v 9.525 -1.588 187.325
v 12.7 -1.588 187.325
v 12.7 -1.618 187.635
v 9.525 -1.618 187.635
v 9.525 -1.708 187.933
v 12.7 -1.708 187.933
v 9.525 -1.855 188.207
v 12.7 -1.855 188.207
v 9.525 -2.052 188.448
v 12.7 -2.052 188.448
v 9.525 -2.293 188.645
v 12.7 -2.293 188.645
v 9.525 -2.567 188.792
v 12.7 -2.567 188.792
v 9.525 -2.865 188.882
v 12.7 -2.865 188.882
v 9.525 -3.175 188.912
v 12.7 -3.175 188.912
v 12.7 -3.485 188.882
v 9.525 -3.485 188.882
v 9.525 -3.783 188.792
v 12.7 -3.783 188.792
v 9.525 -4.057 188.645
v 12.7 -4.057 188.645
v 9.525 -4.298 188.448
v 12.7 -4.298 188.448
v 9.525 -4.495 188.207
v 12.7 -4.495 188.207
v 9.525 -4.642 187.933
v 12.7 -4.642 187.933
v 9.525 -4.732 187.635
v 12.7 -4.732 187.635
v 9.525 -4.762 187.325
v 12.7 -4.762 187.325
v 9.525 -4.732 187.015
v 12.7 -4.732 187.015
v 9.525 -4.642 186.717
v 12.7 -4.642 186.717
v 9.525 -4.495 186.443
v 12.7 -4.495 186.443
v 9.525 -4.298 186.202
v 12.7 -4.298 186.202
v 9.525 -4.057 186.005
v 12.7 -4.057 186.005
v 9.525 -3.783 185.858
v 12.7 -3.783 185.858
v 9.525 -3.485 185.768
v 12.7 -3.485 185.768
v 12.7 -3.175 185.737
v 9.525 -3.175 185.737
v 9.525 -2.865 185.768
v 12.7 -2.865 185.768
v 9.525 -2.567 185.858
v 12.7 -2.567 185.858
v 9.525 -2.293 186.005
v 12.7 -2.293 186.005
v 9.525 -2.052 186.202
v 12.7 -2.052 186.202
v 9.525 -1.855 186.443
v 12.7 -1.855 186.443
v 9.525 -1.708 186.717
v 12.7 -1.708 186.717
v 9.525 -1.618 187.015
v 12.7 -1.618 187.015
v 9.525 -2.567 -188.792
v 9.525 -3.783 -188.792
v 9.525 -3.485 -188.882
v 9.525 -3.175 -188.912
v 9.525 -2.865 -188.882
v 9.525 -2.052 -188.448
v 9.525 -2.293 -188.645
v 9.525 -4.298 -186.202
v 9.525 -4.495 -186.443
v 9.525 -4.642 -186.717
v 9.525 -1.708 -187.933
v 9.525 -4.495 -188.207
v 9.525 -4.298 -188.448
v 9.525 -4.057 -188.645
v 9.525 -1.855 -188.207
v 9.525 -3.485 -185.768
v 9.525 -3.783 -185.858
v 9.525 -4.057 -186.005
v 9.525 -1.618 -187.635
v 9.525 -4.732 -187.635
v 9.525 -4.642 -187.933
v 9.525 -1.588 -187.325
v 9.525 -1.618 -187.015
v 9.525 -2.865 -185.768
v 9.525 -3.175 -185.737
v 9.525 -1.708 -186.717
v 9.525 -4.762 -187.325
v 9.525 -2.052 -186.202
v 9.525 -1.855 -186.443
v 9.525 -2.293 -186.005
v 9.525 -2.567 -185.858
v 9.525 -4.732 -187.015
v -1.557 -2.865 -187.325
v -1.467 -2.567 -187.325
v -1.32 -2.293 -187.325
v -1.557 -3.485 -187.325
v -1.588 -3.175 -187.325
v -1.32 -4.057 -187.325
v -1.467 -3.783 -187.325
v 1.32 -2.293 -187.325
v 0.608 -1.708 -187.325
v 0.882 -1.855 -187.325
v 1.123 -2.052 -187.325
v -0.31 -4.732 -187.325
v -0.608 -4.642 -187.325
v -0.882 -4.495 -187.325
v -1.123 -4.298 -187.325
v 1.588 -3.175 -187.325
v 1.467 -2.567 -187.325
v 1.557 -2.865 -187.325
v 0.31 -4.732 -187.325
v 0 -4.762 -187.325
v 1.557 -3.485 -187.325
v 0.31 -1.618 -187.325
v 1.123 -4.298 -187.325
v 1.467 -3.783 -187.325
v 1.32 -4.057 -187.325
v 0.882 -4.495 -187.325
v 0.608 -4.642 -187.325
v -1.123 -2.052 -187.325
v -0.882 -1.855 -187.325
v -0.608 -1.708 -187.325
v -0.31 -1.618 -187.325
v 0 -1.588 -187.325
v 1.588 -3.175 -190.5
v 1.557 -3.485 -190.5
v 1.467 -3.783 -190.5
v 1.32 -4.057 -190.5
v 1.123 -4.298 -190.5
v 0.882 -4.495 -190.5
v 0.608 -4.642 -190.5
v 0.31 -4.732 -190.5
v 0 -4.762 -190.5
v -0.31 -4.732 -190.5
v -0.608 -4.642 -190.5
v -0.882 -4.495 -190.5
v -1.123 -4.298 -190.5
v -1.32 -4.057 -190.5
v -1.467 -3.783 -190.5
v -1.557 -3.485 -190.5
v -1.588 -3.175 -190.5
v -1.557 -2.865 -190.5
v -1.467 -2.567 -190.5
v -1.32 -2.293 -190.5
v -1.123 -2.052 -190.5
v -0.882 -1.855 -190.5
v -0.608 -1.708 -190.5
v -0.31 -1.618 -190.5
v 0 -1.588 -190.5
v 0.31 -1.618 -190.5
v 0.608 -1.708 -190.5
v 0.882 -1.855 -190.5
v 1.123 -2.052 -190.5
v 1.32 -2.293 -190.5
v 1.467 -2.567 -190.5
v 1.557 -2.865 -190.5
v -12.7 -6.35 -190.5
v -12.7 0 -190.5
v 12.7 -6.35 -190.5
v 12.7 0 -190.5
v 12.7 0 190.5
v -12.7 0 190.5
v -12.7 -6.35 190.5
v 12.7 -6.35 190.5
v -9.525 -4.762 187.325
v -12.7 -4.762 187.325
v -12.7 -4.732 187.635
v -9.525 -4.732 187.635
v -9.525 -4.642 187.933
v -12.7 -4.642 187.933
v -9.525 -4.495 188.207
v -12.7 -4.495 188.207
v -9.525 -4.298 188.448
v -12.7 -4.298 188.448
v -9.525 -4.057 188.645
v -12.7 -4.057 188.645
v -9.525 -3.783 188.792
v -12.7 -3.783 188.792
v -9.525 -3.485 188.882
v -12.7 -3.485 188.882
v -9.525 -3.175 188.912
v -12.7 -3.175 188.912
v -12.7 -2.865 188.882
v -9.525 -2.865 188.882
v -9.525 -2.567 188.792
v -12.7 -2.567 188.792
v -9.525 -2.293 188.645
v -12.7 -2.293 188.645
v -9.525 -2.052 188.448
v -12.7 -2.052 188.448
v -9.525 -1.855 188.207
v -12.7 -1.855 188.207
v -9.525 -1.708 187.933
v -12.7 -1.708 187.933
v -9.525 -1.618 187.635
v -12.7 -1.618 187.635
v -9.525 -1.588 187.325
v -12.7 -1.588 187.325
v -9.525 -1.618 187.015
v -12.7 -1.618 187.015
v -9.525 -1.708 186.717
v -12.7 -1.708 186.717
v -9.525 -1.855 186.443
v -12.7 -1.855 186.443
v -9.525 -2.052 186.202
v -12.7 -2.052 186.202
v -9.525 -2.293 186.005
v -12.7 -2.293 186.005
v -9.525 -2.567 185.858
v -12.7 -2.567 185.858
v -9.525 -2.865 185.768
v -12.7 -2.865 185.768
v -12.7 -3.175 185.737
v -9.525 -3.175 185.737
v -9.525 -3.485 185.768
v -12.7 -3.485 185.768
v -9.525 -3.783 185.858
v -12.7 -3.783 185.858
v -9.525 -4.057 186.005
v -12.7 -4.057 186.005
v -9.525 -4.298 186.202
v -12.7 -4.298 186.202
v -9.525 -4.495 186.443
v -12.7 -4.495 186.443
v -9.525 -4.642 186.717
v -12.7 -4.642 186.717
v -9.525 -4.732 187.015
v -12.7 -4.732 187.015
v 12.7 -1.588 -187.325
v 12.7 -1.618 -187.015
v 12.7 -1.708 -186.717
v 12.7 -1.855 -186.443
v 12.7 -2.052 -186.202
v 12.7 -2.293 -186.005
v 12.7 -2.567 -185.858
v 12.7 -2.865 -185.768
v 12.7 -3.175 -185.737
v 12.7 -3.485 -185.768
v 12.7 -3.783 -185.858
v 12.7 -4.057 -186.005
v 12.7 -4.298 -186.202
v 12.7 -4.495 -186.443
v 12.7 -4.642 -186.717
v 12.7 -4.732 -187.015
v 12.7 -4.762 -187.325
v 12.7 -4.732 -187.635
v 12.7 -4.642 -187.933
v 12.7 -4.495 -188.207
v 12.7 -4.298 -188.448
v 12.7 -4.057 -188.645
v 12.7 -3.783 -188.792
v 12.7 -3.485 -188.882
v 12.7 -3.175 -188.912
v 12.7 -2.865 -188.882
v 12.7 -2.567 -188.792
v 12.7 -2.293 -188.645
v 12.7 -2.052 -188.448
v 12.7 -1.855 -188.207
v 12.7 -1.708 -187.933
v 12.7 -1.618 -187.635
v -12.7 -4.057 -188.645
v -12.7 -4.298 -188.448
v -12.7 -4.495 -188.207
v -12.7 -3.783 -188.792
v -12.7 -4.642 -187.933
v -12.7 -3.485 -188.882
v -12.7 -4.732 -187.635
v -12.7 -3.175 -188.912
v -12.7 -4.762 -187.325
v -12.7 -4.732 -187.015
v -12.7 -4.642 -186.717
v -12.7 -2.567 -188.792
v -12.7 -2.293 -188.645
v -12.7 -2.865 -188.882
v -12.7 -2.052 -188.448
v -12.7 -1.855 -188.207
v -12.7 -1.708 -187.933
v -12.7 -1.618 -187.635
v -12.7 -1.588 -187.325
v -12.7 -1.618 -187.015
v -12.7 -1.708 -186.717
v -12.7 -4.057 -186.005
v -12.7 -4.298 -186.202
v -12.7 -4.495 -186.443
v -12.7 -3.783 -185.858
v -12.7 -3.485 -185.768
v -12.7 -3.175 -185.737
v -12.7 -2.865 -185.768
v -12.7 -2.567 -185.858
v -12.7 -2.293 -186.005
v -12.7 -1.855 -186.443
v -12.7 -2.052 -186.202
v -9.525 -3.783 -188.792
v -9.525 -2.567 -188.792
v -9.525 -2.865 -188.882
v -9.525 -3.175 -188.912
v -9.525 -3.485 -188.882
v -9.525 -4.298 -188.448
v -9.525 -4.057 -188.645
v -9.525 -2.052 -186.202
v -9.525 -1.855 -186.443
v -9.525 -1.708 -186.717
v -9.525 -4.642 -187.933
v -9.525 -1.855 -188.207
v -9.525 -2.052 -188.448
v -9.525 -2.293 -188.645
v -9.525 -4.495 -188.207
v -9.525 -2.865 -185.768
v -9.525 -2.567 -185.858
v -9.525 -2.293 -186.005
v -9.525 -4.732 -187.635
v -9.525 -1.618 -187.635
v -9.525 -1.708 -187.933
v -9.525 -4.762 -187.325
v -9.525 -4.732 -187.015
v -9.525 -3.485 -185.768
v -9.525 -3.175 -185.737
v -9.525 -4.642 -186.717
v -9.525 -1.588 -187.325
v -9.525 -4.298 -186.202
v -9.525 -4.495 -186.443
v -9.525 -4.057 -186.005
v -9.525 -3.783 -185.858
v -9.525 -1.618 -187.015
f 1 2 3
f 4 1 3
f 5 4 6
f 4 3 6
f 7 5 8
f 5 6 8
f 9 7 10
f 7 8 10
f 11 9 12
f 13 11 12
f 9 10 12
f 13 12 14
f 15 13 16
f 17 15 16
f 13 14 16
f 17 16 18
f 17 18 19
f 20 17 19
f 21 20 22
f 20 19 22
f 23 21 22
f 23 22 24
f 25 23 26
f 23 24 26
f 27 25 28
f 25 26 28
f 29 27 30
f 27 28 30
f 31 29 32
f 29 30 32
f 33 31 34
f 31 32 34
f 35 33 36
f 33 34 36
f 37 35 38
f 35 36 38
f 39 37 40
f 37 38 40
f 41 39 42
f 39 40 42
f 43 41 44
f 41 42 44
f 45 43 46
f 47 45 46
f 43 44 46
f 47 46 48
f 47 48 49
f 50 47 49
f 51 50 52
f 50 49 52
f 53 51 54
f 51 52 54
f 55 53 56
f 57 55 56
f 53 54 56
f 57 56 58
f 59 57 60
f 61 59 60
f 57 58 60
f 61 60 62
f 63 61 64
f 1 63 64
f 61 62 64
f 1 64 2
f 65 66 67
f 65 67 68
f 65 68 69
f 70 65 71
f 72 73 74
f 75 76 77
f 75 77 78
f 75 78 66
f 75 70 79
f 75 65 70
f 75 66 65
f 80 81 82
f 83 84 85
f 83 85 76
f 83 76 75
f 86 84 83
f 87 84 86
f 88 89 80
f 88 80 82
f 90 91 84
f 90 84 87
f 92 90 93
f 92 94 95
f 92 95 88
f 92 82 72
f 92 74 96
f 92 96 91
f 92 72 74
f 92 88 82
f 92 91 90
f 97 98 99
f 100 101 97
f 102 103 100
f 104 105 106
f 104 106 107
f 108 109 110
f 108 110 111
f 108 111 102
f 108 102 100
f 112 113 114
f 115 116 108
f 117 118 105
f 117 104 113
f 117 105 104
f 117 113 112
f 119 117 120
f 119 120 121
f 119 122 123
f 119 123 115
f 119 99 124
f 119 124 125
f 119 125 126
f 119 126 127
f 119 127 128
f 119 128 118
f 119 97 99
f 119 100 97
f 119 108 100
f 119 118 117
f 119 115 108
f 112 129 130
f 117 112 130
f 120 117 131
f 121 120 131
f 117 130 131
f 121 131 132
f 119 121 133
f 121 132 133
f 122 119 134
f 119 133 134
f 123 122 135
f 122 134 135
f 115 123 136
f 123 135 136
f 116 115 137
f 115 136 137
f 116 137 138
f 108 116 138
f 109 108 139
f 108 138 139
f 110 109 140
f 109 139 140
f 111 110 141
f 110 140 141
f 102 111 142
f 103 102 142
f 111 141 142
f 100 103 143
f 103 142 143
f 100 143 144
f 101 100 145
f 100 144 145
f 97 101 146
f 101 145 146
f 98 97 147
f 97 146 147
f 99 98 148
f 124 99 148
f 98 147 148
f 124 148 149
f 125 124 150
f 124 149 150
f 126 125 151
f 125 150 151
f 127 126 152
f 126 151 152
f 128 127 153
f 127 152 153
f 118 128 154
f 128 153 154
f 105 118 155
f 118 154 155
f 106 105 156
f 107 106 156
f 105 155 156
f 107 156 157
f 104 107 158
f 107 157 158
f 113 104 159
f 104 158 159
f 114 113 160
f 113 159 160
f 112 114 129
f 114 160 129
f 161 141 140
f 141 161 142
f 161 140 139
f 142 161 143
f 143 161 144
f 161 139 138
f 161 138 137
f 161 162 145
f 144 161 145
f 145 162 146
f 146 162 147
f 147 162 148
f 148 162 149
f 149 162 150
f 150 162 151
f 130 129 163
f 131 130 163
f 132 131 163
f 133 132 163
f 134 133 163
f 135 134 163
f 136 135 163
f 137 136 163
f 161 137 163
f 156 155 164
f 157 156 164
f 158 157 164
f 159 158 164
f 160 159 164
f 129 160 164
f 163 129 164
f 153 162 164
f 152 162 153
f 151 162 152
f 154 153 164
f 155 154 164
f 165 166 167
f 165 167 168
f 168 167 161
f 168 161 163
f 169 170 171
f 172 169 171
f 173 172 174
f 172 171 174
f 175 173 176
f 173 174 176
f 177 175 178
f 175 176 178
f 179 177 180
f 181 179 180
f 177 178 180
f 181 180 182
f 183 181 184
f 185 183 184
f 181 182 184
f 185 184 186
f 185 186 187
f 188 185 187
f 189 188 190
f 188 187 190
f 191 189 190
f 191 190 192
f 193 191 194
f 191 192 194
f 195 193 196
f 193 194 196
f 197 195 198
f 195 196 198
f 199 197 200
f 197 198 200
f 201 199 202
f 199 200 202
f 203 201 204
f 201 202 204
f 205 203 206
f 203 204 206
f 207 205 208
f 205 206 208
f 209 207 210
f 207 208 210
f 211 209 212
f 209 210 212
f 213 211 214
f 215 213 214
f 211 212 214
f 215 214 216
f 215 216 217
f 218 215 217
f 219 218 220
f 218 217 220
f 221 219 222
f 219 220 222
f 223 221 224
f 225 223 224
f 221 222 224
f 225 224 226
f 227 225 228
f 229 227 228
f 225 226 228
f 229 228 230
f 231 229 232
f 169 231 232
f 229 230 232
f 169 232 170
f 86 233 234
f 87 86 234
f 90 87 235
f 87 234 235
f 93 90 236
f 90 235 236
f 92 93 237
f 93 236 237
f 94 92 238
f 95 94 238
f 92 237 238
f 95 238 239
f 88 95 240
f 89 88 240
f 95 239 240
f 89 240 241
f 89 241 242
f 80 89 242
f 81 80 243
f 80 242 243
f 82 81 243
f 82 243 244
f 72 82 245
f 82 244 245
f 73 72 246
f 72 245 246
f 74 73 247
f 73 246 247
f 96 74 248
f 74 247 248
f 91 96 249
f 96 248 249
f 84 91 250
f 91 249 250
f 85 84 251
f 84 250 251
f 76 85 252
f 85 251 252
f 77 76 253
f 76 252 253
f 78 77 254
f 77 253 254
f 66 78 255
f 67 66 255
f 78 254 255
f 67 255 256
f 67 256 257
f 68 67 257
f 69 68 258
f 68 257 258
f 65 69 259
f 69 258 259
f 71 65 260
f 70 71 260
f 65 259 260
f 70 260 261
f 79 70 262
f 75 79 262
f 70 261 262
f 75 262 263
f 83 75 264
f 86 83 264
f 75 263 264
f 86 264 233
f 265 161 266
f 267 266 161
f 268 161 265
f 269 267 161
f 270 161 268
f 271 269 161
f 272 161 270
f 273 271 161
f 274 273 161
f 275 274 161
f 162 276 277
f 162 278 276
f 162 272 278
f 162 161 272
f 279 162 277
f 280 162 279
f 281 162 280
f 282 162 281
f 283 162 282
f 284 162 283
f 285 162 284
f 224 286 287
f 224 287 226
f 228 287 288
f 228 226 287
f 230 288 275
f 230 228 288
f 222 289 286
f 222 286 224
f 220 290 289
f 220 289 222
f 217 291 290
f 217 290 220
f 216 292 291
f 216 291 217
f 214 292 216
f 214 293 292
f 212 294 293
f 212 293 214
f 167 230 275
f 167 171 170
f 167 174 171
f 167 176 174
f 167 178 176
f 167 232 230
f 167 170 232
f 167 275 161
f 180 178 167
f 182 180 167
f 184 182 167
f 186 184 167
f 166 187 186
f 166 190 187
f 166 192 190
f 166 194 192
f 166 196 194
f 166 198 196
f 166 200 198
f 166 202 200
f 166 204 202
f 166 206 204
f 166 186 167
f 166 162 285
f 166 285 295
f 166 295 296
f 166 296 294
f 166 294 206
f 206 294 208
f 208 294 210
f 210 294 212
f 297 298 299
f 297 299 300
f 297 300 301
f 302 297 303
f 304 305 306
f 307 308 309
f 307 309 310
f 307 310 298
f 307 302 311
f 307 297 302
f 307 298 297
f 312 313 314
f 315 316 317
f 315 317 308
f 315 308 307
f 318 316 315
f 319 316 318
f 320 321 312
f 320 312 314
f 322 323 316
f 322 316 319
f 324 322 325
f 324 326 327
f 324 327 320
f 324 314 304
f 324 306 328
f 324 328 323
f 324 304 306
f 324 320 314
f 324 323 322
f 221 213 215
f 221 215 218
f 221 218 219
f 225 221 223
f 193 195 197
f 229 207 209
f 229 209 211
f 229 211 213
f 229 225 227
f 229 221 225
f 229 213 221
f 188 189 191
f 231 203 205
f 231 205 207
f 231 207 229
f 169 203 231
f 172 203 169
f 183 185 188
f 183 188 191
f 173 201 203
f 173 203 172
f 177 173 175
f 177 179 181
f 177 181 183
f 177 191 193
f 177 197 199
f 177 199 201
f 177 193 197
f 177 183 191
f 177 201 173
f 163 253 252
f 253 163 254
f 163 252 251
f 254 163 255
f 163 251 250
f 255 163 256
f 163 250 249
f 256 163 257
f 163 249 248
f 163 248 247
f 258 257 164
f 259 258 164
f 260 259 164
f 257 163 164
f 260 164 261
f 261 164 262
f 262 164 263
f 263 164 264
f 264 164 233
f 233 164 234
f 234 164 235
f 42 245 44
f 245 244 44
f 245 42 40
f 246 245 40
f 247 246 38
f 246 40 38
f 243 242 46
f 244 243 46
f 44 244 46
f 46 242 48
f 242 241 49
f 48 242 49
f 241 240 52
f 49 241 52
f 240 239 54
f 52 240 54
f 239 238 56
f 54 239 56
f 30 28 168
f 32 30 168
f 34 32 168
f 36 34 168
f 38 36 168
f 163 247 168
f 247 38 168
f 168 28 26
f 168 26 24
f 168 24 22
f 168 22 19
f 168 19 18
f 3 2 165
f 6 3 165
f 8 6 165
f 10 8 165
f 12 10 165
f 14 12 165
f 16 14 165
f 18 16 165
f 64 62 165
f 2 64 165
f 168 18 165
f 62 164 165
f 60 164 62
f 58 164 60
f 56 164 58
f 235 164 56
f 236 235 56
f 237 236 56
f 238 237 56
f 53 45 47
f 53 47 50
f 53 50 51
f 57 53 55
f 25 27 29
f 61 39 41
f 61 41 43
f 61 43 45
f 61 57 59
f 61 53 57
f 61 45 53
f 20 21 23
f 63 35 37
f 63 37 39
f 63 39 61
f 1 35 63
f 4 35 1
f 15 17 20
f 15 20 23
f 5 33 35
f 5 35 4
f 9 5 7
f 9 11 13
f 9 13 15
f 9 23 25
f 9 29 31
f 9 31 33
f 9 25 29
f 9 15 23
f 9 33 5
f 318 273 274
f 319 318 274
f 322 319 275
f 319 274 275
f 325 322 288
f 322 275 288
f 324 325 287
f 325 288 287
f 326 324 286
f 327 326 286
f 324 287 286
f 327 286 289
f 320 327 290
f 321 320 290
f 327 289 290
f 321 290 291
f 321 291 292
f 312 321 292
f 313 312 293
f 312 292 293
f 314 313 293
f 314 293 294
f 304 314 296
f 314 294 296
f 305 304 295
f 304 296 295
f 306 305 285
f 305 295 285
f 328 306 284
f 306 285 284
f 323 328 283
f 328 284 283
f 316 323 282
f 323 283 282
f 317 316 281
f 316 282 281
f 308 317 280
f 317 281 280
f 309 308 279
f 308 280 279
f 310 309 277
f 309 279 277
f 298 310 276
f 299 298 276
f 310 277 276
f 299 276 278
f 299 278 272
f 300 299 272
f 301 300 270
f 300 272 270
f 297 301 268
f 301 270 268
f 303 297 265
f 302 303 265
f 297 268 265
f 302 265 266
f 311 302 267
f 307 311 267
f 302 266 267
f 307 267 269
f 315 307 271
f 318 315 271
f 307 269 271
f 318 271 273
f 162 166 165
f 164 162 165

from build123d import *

# Parameters (mm, degrees)
F0_W     = 25.4
F0_H     = 381
F1_DEPTH = 6.35
F2_R     = 1.5875
F3_DEPTH = 3.175
F4_R     = 1.5875
F5_DEPTH = 3.175
F6_R     = 1.5875
F7_DEPTH = 3.175


with BuildPart() as f1:
    # F0 (on Front) → F1 (new body)
    with BuildSketch(Plane.XZ):
        Rectangle(F0_W, F0_H)
    extrude(amount=F1_DEPTH)

    # F2 (on face) → F3 (cut)
    with BuildSketch(Plane.YZ.offset(12.7)):
        with Locations((-3.175, 187.325)):
            Circle(F2_R)
        with Locations((-3.175, -187.325)):
            Circle(F2_R)
    extrude(amount=-F3_DEPTH, mode=Mode.SUBTRACT)

    # F4 (on face) → F5 (cut)
    with BuildSketch(Plane(origin=(-12.7, 0, 0), x_dir=(0, -1, 0), z_dir=(-1, 0, 0))):
        with Locations((3.175, 187.325)):
            Circle(F4_R)
        with Locations((3.175, -187.325)):
            Circle(F4_R)
    extrude(amount=-F5_DEPTH, mode=Mode.SUBTRACT)

    # F6 (on face) → F7 (cut)
    with BuildSketch(Plane(origin=(0, 0, -190.5), x_dir=(1, 0, 0), z_dir=(0, 0, -1))):
        with Locations((0, 3.175)):
            Circle(F6_R)
    extrude(amount=-F7_DEPTH, mode=Mode.SUBTRACT)


solid = f1.part
